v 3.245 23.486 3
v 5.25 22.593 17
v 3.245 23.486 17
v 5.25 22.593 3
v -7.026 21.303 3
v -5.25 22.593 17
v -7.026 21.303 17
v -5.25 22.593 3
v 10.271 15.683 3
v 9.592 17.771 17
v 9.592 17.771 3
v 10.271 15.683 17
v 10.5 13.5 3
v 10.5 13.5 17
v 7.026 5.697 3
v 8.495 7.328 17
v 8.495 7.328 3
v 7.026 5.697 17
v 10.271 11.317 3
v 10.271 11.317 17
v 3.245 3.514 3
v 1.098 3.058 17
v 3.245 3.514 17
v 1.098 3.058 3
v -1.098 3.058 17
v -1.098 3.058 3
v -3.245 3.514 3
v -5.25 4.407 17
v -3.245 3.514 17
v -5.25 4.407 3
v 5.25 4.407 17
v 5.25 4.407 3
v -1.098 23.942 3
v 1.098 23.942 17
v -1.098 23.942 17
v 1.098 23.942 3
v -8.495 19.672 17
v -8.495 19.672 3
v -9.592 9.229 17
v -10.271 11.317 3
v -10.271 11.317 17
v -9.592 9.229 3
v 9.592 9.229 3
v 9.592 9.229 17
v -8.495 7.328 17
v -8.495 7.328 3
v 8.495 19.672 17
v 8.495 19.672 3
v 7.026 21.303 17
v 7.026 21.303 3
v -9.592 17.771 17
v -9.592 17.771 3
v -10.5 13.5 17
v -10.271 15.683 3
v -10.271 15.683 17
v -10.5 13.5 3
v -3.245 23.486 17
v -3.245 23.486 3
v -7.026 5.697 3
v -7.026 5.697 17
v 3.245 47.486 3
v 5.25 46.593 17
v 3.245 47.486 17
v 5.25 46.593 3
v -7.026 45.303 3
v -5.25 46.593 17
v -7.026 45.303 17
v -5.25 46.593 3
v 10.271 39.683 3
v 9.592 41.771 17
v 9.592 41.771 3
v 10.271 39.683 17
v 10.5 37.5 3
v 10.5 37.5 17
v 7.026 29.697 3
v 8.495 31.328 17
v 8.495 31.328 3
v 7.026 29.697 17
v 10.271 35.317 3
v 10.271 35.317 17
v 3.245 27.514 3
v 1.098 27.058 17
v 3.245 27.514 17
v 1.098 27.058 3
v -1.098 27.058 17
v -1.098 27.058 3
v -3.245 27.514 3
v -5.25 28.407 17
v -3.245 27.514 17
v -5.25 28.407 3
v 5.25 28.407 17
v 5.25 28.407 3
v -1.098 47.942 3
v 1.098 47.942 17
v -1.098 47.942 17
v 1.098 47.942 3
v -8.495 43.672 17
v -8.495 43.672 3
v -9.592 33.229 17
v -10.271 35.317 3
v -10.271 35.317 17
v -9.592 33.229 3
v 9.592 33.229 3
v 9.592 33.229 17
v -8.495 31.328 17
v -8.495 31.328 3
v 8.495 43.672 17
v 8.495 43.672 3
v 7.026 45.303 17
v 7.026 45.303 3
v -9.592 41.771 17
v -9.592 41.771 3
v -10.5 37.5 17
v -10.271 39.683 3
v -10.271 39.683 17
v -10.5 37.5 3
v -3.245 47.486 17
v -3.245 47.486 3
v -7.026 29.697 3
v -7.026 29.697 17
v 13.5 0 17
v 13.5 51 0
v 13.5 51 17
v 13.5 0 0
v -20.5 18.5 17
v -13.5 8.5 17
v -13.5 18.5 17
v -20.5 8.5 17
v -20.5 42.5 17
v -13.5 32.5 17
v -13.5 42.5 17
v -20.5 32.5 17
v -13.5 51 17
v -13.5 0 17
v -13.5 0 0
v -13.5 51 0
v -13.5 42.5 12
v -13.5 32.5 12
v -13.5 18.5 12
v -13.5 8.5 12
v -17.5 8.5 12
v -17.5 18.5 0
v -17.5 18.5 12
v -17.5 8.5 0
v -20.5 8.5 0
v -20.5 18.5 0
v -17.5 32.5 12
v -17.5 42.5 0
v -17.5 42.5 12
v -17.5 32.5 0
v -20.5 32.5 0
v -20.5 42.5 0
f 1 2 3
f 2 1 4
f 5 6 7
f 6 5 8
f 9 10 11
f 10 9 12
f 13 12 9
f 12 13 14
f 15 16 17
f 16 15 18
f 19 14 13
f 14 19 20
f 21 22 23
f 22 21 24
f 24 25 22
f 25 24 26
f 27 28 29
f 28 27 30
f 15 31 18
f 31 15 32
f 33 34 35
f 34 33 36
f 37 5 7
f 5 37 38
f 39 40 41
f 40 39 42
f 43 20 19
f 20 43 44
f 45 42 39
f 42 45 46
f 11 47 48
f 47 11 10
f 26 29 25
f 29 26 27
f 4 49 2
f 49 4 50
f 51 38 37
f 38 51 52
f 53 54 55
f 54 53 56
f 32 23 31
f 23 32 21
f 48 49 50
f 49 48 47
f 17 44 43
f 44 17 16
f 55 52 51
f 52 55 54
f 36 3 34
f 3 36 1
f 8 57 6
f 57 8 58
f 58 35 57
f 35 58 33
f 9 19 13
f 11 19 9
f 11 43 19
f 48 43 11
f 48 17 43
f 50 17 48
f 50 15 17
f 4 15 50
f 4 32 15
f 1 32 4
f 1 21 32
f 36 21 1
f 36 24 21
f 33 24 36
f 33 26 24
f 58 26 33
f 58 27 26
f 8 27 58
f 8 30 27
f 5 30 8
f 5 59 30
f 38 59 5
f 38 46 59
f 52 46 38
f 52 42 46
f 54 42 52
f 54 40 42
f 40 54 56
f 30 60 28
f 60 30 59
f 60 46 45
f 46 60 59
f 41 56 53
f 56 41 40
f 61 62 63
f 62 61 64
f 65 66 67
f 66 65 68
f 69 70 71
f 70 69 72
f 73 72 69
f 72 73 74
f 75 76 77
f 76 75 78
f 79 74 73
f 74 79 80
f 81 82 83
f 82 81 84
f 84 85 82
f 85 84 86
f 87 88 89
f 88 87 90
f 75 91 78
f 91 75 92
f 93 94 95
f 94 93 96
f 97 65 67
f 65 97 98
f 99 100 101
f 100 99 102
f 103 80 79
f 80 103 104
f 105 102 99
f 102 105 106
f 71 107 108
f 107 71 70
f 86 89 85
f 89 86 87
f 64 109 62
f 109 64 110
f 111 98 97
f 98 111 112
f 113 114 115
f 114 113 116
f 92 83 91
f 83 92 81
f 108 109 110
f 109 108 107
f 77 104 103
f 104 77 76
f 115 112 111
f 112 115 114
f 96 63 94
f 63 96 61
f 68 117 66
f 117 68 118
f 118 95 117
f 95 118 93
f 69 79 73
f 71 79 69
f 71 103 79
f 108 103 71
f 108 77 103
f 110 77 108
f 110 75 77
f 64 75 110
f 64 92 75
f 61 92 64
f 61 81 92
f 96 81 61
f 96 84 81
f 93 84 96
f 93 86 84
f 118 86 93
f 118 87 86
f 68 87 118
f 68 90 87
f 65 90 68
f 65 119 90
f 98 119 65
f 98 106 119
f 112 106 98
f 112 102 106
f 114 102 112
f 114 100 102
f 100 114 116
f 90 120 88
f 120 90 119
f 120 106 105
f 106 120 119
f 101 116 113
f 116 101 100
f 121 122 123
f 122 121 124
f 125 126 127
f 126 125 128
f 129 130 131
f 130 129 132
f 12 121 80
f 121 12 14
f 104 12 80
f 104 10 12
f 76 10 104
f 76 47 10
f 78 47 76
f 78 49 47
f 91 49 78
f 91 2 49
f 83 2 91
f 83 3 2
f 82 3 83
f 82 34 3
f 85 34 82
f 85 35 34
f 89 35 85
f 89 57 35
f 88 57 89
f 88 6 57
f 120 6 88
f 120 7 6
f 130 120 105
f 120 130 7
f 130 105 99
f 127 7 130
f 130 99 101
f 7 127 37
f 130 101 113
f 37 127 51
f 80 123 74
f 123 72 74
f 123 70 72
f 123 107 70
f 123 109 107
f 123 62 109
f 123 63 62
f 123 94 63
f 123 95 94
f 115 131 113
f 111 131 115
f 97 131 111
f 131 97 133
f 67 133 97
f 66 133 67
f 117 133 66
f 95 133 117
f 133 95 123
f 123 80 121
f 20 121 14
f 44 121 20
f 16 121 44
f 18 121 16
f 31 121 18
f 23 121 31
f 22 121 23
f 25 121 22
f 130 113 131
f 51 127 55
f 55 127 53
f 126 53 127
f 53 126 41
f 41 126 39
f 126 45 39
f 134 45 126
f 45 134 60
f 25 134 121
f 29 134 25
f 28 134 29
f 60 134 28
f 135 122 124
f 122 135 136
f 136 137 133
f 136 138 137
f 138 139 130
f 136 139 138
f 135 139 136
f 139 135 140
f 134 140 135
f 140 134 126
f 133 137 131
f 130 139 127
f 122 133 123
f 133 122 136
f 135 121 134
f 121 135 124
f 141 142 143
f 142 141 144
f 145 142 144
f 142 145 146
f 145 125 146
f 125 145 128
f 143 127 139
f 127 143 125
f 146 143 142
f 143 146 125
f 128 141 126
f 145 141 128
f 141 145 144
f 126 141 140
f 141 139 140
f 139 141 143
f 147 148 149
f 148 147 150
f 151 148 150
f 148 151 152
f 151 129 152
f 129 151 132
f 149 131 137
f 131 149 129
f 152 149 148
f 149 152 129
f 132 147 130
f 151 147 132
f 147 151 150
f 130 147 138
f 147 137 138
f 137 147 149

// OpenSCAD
// 18650 holder
//
// http://www.thingiverse.com/mikegi/about

number_of_batteries = 2; // [1:8] 
battery_diameter =  18 + 3 ; 
holder_height = 17; // [10:30]
space_on_bottom = 3; // [2:5] 
space_between_holders_and_edges = 3; // [2:10]
clips = "true"; // [true, false]

difference()
{
translate( [-(battery_diameter + space_between_holders_and_edges *2)/2, 0,0])
cube([ battery_diameter + space_between_holders_and_edges *2  , battery_diameter * number_of_batteries + space_between_holders_and_edges * (number_of_batteries + 1) , holder_height]);

translate([0, -( battery_diameter/2) ,space_on_bottom ])
for (i = [ 1:number_of_batteries ])
{
translate([0,(space_between_holders_and_edges + battery_diameter) * i, 0])
cylinder( h = holder_height, d = battery_diameter);

}
}

if ( clips == "true" )
{
translate([0, -( battery_diameter/2) ,0])
for (i = [ 1:number_of_batteries ])
{
translate([0,(space_between_holders_and_edges + battery_diameter) * i, 0])
{
translate([ - (battery_diameter/2 + space_between_holders_and_edges + 7), -5, 0 ])
cube( [3,10,holder_height] );
translate([- (battery_diameter/2 + space_between_holders_and_edges + 6), -5,holder_height-5])
cube( [6,10,5] );
}
}

}
